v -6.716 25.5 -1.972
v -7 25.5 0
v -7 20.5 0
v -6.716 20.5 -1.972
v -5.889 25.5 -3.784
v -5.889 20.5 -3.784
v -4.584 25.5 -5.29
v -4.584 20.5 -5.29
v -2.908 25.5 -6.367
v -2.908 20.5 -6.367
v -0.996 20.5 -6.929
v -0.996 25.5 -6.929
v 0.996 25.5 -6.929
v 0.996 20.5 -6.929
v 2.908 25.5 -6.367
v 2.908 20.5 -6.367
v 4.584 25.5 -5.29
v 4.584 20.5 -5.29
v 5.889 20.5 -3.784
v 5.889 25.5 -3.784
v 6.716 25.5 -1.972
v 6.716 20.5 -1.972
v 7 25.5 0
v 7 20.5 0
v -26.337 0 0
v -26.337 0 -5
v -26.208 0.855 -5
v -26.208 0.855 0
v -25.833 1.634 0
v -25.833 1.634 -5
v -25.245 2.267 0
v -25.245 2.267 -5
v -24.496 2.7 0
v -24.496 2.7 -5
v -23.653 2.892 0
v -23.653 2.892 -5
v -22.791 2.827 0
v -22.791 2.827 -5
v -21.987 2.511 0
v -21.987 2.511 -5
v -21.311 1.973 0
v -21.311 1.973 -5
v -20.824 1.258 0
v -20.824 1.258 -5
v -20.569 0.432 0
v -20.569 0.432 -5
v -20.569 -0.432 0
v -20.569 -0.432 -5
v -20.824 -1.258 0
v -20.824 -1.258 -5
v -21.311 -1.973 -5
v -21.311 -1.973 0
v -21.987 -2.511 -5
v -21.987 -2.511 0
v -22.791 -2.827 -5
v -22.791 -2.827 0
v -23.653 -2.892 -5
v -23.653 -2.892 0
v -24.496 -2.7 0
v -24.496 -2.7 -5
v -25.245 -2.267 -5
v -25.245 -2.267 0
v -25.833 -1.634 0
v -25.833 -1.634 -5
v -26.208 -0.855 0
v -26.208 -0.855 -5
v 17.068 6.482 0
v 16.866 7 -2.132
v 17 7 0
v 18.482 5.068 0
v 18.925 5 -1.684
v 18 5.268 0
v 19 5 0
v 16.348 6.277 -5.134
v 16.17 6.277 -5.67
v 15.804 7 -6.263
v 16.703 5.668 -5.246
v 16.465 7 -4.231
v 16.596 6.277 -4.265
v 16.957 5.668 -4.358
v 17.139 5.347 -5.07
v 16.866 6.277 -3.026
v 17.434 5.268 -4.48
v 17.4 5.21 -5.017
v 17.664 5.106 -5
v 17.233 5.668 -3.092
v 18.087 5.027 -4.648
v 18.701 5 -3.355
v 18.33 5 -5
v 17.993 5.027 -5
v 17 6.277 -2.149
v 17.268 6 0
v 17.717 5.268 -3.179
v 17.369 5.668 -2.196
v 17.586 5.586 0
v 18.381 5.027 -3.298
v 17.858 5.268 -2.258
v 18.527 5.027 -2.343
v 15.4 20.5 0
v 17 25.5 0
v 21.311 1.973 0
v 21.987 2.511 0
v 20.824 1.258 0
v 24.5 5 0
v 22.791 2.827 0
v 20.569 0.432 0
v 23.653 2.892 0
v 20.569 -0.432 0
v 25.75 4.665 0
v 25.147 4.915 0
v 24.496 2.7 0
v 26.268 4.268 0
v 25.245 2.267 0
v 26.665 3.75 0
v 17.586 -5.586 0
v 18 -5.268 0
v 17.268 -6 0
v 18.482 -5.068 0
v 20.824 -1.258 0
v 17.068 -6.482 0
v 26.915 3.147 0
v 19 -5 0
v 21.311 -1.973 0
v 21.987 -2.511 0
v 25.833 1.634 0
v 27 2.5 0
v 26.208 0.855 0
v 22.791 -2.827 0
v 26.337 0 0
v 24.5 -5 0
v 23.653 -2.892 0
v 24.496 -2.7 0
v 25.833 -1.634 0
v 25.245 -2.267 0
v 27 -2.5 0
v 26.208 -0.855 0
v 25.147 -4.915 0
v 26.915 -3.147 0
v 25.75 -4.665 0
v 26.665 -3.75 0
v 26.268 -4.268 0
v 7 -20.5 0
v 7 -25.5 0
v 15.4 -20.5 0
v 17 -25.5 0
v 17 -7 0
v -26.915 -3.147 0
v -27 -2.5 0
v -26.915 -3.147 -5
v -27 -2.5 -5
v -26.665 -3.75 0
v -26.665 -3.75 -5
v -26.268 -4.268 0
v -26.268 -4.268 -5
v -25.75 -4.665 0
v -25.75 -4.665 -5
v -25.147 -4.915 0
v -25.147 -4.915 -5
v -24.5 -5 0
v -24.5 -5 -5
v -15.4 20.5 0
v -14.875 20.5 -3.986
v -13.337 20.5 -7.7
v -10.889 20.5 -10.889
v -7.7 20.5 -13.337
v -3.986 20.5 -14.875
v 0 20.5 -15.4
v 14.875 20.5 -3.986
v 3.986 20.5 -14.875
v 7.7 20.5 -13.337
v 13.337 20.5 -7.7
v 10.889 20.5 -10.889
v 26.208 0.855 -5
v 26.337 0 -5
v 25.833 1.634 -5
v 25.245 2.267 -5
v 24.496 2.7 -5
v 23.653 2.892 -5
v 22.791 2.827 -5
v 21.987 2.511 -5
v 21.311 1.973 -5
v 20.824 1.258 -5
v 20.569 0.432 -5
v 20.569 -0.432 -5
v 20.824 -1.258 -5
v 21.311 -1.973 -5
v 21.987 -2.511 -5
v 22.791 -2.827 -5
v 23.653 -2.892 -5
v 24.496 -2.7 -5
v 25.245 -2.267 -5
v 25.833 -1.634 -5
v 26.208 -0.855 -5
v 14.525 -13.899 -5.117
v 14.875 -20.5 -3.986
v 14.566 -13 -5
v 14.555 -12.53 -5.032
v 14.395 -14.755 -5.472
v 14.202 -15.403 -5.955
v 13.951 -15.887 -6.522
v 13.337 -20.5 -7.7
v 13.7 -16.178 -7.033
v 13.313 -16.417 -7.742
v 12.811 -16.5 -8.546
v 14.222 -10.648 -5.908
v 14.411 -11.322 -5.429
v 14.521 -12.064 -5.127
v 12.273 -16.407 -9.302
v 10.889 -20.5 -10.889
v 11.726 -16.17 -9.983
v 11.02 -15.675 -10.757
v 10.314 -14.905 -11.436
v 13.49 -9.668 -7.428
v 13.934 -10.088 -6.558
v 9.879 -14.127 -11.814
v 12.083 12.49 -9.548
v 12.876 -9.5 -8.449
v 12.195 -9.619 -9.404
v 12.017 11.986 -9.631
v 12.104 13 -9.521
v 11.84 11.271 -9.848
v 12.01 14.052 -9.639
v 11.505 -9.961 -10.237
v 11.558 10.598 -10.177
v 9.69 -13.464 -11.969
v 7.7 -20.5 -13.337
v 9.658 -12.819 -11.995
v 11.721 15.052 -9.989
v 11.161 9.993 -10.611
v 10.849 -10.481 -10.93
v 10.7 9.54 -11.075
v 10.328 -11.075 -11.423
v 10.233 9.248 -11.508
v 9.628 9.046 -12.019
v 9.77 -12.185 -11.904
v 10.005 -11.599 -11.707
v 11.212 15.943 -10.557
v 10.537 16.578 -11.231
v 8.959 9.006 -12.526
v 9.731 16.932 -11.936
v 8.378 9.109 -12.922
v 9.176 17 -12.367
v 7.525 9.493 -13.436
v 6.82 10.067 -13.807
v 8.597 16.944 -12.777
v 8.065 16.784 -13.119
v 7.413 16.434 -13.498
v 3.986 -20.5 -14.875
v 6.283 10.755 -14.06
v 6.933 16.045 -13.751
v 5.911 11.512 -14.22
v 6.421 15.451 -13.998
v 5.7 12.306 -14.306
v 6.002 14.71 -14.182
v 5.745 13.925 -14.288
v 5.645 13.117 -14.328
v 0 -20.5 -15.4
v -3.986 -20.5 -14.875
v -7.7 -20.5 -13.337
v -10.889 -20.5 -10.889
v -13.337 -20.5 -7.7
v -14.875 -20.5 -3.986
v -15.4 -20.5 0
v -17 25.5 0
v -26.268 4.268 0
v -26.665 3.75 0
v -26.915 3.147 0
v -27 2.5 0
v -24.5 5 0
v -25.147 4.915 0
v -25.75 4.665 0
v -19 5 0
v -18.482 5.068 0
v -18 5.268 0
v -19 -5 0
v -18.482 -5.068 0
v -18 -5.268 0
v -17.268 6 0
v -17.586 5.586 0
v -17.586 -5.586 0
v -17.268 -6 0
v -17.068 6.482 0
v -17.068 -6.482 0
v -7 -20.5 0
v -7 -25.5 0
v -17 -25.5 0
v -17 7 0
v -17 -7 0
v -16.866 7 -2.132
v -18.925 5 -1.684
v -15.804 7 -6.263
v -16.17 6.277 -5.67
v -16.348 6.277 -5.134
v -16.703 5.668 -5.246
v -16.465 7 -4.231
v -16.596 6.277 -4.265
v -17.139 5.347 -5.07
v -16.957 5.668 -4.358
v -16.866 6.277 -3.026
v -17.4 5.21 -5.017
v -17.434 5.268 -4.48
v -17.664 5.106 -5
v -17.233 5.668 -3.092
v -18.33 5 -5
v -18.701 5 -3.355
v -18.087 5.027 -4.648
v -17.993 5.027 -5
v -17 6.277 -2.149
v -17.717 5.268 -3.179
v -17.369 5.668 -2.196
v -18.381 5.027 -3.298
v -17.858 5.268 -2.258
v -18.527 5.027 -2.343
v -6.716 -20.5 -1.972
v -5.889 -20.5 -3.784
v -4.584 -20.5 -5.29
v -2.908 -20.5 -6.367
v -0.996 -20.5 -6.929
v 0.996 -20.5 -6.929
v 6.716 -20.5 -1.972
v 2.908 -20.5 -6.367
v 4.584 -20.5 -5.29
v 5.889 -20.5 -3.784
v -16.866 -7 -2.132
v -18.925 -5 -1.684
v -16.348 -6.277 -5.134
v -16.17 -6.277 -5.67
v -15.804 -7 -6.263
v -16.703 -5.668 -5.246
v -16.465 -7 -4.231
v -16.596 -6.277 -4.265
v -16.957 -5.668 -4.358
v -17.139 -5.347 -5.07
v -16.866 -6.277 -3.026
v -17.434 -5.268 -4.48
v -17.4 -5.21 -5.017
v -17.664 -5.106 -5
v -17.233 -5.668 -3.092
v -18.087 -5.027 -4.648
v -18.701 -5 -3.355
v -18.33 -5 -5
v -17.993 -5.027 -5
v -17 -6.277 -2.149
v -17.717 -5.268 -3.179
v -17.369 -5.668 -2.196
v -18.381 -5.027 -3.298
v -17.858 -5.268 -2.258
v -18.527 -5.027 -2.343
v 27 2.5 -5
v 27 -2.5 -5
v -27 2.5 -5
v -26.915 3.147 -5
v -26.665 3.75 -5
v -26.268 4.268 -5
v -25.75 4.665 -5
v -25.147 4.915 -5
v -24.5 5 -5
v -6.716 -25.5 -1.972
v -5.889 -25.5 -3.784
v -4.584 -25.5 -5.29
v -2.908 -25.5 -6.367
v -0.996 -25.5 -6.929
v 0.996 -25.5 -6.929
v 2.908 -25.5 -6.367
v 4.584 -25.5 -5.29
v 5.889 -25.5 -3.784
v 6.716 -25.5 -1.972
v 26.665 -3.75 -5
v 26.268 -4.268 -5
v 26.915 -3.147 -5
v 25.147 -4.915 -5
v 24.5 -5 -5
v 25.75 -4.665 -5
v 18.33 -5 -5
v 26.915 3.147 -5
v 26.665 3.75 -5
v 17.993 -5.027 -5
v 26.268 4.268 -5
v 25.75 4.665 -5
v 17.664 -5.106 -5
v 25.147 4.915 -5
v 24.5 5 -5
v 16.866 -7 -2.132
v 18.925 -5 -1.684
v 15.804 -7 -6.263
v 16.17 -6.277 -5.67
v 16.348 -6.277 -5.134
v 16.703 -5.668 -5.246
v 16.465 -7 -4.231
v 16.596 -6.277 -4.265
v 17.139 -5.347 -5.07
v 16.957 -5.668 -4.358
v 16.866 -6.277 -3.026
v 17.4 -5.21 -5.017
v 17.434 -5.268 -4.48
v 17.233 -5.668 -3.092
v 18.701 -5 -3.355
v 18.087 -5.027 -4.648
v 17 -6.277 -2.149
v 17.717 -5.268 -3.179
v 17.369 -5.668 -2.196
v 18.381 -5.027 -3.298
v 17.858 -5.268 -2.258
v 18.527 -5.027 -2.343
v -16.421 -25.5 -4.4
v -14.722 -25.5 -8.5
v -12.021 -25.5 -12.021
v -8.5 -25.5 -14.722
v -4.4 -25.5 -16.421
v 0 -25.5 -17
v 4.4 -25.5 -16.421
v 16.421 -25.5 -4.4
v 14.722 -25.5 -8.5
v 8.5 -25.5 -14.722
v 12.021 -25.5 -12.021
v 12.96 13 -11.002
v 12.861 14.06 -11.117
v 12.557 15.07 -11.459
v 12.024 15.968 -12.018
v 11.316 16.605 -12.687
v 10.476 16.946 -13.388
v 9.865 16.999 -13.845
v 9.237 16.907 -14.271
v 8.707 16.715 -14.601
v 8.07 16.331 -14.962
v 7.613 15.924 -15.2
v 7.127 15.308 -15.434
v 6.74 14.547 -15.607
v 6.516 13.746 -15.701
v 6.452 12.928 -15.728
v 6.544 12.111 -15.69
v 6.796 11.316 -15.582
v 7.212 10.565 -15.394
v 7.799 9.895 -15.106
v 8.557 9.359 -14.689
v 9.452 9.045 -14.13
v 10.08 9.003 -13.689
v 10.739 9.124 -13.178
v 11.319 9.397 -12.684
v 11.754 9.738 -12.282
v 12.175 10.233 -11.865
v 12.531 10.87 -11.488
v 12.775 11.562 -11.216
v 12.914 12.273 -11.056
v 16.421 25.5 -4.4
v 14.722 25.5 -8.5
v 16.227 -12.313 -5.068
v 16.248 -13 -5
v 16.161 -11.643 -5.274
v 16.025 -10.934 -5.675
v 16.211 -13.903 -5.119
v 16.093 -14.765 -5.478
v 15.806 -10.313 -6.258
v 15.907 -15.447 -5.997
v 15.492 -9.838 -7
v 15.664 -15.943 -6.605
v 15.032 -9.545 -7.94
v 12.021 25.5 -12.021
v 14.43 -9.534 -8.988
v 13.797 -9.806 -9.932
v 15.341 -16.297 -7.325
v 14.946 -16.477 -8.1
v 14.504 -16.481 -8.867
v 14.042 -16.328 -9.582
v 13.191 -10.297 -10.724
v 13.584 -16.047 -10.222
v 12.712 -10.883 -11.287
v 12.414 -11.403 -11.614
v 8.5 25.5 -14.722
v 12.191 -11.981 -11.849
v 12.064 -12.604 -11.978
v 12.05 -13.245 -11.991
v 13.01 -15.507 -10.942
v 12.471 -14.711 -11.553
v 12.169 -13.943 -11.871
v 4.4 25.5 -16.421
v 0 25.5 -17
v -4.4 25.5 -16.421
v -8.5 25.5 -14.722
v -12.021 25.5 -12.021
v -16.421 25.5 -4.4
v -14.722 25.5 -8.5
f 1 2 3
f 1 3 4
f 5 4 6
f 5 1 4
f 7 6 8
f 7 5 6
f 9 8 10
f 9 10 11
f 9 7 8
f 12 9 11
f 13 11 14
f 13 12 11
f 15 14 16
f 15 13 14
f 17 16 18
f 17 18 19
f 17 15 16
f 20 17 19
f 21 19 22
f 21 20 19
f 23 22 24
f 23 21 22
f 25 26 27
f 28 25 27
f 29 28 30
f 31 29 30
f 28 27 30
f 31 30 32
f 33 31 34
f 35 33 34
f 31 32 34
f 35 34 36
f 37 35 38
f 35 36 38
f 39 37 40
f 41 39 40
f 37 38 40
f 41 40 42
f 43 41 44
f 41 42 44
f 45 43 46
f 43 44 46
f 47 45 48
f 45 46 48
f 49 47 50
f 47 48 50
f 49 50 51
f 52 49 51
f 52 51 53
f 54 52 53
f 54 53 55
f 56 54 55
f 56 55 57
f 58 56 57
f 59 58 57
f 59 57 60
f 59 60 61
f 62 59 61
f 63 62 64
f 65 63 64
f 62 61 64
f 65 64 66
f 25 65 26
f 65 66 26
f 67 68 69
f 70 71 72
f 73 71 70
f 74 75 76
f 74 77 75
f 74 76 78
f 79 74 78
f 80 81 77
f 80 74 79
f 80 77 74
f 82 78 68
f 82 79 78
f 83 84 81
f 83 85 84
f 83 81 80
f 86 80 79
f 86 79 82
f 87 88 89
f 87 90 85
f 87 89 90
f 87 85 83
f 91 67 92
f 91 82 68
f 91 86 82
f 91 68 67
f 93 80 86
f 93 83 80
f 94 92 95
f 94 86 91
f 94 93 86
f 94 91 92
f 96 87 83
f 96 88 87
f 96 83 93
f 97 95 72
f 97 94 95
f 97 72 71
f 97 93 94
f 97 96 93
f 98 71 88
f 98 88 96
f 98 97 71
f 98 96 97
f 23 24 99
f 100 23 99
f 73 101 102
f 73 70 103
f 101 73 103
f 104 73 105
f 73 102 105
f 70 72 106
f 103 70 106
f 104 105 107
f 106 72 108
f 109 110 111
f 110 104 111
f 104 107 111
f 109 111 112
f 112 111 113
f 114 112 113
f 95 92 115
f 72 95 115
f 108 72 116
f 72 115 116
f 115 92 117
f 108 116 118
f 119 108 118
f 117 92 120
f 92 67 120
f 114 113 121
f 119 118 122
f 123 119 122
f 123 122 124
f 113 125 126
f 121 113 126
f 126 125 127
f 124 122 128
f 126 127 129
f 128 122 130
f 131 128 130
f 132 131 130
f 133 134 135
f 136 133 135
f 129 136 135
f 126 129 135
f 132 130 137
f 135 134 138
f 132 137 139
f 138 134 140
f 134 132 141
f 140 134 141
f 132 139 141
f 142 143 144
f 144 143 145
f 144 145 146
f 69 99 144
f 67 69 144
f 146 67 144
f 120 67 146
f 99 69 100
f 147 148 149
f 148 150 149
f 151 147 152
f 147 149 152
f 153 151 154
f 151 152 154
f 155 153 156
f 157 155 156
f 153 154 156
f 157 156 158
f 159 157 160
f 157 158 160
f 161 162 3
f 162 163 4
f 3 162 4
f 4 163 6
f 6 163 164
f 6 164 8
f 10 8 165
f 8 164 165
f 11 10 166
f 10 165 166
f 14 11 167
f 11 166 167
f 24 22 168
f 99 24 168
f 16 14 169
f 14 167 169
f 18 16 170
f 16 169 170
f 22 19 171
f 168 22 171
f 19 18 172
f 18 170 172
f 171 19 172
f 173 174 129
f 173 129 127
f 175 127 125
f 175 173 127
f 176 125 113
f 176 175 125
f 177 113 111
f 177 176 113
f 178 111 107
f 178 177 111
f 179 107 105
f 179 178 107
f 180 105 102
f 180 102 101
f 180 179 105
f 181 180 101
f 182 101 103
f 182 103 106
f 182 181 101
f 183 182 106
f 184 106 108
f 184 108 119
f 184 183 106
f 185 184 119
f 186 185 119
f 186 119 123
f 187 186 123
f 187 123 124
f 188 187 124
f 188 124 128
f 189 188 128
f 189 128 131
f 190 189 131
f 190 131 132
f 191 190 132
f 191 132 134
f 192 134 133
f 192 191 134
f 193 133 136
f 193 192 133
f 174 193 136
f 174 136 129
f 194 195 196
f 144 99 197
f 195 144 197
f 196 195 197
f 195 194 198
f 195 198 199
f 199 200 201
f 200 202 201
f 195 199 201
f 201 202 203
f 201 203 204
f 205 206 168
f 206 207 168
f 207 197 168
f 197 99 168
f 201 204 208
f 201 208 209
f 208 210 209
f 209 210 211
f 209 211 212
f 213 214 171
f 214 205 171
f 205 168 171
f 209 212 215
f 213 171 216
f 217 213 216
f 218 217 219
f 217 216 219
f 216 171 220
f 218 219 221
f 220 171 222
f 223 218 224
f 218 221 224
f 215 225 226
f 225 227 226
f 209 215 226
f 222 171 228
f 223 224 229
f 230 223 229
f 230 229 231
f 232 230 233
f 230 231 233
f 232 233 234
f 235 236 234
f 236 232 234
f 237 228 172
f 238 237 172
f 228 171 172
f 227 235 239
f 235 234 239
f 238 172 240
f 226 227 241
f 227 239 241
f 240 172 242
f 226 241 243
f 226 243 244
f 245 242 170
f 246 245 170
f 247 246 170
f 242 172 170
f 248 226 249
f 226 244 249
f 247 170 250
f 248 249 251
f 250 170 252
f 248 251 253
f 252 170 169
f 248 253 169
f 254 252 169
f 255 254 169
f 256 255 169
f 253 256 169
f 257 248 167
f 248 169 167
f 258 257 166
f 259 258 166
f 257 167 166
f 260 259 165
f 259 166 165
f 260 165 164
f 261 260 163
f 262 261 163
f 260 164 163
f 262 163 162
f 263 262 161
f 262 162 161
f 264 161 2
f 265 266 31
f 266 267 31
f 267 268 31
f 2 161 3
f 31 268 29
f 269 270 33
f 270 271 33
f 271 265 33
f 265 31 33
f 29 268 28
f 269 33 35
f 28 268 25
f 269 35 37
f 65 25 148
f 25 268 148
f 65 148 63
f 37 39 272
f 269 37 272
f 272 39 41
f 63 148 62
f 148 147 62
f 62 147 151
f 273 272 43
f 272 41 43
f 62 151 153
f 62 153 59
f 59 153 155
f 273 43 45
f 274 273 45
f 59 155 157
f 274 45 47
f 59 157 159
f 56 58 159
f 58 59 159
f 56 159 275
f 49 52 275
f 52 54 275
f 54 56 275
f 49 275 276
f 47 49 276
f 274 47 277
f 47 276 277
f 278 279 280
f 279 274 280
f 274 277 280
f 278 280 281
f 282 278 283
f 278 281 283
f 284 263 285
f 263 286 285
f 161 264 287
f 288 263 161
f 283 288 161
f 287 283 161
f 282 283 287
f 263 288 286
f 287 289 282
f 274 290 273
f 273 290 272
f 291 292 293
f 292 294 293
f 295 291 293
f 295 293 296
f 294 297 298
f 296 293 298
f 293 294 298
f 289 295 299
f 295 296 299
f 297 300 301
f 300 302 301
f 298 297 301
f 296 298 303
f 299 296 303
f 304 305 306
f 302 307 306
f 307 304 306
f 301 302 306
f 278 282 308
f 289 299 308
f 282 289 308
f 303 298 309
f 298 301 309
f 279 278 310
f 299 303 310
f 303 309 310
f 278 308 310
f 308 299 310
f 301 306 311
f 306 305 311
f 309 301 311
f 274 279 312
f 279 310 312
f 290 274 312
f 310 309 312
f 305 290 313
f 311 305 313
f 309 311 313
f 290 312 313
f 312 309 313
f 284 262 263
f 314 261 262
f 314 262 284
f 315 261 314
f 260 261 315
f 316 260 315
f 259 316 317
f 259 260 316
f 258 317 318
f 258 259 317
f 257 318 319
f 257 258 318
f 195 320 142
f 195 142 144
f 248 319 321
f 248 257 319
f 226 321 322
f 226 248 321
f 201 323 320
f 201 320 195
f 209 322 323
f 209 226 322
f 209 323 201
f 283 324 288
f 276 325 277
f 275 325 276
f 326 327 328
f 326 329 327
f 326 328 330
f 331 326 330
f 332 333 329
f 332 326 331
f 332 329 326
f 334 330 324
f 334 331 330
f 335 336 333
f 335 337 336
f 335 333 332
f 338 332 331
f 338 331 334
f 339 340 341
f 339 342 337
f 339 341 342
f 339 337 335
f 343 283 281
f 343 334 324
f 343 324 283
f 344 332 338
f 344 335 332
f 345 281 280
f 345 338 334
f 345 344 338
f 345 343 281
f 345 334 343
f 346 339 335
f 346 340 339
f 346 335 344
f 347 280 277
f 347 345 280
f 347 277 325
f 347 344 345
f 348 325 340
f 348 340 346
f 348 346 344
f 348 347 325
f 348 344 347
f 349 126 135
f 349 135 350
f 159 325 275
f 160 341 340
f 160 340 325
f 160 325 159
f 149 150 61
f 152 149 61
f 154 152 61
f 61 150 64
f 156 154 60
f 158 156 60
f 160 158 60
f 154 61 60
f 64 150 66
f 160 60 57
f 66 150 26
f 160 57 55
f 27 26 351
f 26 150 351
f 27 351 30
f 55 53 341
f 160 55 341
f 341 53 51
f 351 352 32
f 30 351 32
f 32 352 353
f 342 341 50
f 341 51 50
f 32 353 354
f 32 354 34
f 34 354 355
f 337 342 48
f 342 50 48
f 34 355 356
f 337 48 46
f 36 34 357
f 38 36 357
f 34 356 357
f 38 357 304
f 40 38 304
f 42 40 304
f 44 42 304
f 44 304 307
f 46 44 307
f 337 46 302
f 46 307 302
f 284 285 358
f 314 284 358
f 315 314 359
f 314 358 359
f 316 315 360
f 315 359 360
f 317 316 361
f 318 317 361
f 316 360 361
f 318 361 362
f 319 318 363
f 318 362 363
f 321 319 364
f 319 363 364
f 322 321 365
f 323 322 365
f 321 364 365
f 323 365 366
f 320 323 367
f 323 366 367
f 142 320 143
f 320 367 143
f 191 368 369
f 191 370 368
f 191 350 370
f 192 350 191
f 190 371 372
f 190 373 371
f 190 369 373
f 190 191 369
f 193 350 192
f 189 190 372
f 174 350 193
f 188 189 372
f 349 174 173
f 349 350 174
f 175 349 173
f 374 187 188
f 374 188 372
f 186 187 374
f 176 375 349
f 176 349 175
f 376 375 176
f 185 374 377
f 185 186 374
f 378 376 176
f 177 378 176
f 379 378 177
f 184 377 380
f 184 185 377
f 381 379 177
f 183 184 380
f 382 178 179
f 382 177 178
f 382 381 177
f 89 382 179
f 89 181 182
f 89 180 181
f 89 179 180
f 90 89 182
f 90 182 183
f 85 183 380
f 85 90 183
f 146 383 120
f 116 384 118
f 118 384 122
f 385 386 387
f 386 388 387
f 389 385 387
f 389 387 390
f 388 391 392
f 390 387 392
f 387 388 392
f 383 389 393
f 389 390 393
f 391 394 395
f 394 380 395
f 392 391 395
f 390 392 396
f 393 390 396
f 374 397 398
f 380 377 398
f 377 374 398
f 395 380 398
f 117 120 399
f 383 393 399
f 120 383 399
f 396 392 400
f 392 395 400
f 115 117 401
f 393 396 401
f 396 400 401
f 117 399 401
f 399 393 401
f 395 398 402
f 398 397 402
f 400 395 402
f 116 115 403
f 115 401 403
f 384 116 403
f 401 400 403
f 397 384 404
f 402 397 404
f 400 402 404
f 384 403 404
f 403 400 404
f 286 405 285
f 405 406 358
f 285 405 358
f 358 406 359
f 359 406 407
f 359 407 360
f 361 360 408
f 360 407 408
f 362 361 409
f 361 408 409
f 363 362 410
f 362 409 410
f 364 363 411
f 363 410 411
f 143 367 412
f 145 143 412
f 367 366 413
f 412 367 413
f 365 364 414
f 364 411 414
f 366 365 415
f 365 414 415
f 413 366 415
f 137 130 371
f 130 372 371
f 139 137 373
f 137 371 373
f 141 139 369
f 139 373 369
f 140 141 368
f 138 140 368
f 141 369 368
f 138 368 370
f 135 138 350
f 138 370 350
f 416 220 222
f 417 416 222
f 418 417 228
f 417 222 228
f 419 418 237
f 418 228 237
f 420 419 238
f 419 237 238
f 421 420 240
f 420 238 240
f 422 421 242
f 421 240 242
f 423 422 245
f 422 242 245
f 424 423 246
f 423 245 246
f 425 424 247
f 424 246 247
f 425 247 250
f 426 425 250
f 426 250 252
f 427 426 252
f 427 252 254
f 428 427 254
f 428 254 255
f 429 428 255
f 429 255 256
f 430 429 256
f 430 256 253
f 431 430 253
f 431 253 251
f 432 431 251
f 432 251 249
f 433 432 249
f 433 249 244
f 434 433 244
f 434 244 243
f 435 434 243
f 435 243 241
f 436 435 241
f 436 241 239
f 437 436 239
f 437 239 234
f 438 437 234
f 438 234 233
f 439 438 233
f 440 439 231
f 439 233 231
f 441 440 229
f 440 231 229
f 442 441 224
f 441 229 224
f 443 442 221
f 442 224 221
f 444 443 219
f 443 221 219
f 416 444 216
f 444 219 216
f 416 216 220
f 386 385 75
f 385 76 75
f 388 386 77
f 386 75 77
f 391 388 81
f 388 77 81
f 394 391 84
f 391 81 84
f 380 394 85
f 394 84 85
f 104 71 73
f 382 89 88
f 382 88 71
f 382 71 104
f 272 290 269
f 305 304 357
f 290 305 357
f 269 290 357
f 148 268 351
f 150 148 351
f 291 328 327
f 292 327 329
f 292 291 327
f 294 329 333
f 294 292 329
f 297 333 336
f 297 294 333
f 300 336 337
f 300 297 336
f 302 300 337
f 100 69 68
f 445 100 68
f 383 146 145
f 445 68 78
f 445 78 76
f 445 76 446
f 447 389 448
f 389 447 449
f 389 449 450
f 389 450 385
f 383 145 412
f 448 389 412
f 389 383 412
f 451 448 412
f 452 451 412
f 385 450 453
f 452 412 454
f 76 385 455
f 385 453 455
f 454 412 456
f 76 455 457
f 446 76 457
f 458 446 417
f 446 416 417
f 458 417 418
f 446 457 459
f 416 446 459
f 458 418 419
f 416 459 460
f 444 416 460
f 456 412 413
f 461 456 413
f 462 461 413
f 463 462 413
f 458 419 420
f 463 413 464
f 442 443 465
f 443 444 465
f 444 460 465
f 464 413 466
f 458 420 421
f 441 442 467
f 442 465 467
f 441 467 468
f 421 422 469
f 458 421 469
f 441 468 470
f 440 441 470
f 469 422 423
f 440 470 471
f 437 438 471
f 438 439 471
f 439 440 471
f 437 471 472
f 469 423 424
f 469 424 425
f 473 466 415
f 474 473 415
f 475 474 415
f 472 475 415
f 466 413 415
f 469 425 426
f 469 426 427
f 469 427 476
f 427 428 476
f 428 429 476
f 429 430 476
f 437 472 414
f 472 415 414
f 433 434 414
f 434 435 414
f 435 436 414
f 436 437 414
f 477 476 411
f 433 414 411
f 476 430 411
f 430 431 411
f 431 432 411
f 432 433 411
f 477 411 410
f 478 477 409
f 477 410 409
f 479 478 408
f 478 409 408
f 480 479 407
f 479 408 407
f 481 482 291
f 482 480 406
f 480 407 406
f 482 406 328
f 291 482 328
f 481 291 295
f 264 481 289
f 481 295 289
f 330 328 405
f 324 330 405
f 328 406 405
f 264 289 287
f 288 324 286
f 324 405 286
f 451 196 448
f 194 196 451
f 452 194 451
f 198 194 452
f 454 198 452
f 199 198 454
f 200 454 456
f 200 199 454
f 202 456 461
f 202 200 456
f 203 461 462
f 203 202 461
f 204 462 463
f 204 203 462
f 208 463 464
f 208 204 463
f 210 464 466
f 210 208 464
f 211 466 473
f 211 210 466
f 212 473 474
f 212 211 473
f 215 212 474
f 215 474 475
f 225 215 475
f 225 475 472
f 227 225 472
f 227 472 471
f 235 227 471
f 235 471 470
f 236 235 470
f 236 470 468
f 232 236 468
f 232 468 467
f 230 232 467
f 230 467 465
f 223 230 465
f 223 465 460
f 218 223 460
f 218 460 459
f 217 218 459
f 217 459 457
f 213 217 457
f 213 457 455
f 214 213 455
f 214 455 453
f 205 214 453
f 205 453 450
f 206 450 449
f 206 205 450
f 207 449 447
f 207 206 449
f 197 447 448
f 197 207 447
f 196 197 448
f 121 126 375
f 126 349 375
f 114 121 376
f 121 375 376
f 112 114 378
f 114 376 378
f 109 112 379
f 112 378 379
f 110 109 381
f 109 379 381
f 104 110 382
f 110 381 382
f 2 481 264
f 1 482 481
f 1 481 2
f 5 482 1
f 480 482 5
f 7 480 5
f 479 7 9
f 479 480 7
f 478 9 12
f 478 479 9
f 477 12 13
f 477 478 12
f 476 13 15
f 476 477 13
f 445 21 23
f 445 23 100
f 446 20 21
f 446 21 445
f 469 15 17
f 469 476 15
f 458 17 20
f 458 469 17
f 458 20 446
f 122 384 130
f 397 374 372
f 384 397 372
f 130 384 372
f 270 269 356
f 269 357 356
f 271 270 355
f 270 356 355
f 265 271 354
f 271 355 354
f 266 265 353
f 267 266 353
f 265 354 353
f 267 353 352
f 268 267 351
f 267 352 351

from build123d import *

# Parameters (mm, degrees)
BOSS_EXTRUDE1_DEPTH  = 20.5
BOSS_EXTRUDE2_START  = 5
BOSS_EXTRUDE2_DEPTH  = 5
BOSS_EXTRUDE3_DEPTH  = 5
FILLET1_R            = 2
SKETCH8_R            = 2.9
CUT_EXTRUDE4_DEPTH   = 5
FILLET1_OF_MIRROR3_R = 2
FILLET2_R            = 2.5
SKETCH9_R            = 3.5
CUT_EXTRUDE5_DEPTH   = 50
SKETCH17_R           = 4
CUT_EXTRUDE8_DEPTH   = 50


with BuildPart() as part:
    # Sketch1 → Boss-Extrude1 (new, symmetric)
    with BuildSketch(Plane(origin=(0, 0, 0), x_dir=(1, 0, 0), z_dir=(0, 1, 0))):
        with BuildLine():
            Line((-15.4, 0), (-17, 0))
            ThreePointArc((-17, 0), (0, 17), (17, 0))
            Line((17, 0), (15.4, 0))
            ThreePointArc((15.4, 0), (0, 15.4), (-15.4, 0))
        make_face()
    extrude(amount=BOSS_EXTRUDE1_DEPTH, both=True)

    # Sketch6 → Boss-Extrude2 (add)
    with BuildSketch(Plane(origin=(0, 20.5, 0), x_dir=(1, 0, 0), z_dir=(0, 1, 0)).offset(BOSS_EXTRUDE2_START)):
        with BuildLine():
            Line((-17, 0), (-7, 0))
            ThreePointArc((-7, 0), (0, 7), (7, 0))
            Line((7, 0), (17, 0))
            ThreePointArc((17, 0), (0, 17), (-17, 0))
        make_face()
    boss_extrude2 = extrude(amount=-BOSS_EXTRUDE2_DEPTH)

    # Mirror1: Boss-Extrude2 across plane
    add(boss_extrude2.mirror(Plane.ZX))

    # Sketch7 → Boss-Extrude3 (add, symmetric)
    with BuildSketch(Plane(origin=(0, 0, 0), x_dir=(1, 0, 0), z_dir=(0, 1, 0))):
        with BuildLine():
            Line((-17, 0), (-27, 0))
            Line((-27, 0), (-27, 5))
            Line((-27, 5), (-16.248076809, 5))
            ThreePointArc((-16.248076809, 5), (-16.810968231, 2.528111374), (-17, 0))
        make_face()
    boss_extrude3 = extrude(amount=BOSS_EXTRUDE3_DEPTH, both=True)

    # Fillet1
    fillet1_edges = [part.edges().sort_by_distance(p)[0] for p in [
        (-16.810968231, -5, -2.528111374),
        (-16.248076809, 0, -5),
        (-16.810968231, 5, -2.528111374),
    ]]
    fillet(fillet1_edges, radius=FILLET1_R)

    # Sketch8 → Cut-Extrude4 (cut, symmetric)
    with BuildSketch(Plane(origin=(0, 0, -5), x_dir=(-1, 0, 0), z_dir=(0, 0, -1))):
        with Locations((23.436686237, 0)):
            Circle(SKETCH8_R)
    cut_extrude4 = extrude(amount=CUT_EXTRUDE4_DEPTH, both=True, mode=Mode.SUBTRACT)

    # Mirror3: Boss-Extrude3, Cut-Extrude4 across plane
    add(boss_extrude3.mirror(Plane(origin=(0, 0, 0), x_dir=(0, 0, 1), z_dir=(1, 0, 0))))
    add(cut_extrude4.mirror(Plane(origin=(0, 0, 0), x_dir=(0, 0, 1), z_dir=(1, 0, 0))), mode=Mode.SUBTRACT)

    # Fillet1 of Mirror3
    fillet1_of_mirror3_edges = [part.edges().sort_by_distance(p)[0] for p in [
        (16.810968231, -5, -2.528111374),
        (16.248076809, 0, -5),
        (16.810968231, 5, -2.528111374),
    ]]
    fillet(fillet1_of_mirror3_edges, radius=FILLET1_OF_MIRROR3_R)

    # Fillet2
    fillet2_edges = [part.edges().sort_by_distance(p)[0] for p in [
        (-27, -5, -2.5),
        (-27, 5, -2.5),
        (27, 5, -2.5),
        (27, -5, -2.5),
    ]]
    fillet(fillet2_edges, radius=FILLET2_R)

    # Sketch9 → Cut-Extrude5 (cut)
    with BuildSketch(Plane(origin=(0, 0, 0), x_dir=(0, 0, -1), z_dir=(1, 0, 0))):
        with Locations(Location((8.5, -13, 0), (0, 0, 180))):
            Circle(SKETCH9_R)
    extrude(amount=CUT_EXTRUDE5_DEPTH, mode=Mode.SUBTRACT)

    # Sketch17 → Cut-Extrude8 (cut)
    with BuildSketch(Plane(origin=(0, 0, 0), x_dir=(0, -1, 0), z_dir=(-0.5000000000000011, 0, 0.8660254037844379))):
        with Locations(Location((-13, 1.722431864, 0), (0, 0, 90))):
            Circle(SKETCH17_R)
    extrude(amount=-CUT_EXTRUDE8_DEPTH, mode=Mode.SUBTRACT)


solid = part.part
